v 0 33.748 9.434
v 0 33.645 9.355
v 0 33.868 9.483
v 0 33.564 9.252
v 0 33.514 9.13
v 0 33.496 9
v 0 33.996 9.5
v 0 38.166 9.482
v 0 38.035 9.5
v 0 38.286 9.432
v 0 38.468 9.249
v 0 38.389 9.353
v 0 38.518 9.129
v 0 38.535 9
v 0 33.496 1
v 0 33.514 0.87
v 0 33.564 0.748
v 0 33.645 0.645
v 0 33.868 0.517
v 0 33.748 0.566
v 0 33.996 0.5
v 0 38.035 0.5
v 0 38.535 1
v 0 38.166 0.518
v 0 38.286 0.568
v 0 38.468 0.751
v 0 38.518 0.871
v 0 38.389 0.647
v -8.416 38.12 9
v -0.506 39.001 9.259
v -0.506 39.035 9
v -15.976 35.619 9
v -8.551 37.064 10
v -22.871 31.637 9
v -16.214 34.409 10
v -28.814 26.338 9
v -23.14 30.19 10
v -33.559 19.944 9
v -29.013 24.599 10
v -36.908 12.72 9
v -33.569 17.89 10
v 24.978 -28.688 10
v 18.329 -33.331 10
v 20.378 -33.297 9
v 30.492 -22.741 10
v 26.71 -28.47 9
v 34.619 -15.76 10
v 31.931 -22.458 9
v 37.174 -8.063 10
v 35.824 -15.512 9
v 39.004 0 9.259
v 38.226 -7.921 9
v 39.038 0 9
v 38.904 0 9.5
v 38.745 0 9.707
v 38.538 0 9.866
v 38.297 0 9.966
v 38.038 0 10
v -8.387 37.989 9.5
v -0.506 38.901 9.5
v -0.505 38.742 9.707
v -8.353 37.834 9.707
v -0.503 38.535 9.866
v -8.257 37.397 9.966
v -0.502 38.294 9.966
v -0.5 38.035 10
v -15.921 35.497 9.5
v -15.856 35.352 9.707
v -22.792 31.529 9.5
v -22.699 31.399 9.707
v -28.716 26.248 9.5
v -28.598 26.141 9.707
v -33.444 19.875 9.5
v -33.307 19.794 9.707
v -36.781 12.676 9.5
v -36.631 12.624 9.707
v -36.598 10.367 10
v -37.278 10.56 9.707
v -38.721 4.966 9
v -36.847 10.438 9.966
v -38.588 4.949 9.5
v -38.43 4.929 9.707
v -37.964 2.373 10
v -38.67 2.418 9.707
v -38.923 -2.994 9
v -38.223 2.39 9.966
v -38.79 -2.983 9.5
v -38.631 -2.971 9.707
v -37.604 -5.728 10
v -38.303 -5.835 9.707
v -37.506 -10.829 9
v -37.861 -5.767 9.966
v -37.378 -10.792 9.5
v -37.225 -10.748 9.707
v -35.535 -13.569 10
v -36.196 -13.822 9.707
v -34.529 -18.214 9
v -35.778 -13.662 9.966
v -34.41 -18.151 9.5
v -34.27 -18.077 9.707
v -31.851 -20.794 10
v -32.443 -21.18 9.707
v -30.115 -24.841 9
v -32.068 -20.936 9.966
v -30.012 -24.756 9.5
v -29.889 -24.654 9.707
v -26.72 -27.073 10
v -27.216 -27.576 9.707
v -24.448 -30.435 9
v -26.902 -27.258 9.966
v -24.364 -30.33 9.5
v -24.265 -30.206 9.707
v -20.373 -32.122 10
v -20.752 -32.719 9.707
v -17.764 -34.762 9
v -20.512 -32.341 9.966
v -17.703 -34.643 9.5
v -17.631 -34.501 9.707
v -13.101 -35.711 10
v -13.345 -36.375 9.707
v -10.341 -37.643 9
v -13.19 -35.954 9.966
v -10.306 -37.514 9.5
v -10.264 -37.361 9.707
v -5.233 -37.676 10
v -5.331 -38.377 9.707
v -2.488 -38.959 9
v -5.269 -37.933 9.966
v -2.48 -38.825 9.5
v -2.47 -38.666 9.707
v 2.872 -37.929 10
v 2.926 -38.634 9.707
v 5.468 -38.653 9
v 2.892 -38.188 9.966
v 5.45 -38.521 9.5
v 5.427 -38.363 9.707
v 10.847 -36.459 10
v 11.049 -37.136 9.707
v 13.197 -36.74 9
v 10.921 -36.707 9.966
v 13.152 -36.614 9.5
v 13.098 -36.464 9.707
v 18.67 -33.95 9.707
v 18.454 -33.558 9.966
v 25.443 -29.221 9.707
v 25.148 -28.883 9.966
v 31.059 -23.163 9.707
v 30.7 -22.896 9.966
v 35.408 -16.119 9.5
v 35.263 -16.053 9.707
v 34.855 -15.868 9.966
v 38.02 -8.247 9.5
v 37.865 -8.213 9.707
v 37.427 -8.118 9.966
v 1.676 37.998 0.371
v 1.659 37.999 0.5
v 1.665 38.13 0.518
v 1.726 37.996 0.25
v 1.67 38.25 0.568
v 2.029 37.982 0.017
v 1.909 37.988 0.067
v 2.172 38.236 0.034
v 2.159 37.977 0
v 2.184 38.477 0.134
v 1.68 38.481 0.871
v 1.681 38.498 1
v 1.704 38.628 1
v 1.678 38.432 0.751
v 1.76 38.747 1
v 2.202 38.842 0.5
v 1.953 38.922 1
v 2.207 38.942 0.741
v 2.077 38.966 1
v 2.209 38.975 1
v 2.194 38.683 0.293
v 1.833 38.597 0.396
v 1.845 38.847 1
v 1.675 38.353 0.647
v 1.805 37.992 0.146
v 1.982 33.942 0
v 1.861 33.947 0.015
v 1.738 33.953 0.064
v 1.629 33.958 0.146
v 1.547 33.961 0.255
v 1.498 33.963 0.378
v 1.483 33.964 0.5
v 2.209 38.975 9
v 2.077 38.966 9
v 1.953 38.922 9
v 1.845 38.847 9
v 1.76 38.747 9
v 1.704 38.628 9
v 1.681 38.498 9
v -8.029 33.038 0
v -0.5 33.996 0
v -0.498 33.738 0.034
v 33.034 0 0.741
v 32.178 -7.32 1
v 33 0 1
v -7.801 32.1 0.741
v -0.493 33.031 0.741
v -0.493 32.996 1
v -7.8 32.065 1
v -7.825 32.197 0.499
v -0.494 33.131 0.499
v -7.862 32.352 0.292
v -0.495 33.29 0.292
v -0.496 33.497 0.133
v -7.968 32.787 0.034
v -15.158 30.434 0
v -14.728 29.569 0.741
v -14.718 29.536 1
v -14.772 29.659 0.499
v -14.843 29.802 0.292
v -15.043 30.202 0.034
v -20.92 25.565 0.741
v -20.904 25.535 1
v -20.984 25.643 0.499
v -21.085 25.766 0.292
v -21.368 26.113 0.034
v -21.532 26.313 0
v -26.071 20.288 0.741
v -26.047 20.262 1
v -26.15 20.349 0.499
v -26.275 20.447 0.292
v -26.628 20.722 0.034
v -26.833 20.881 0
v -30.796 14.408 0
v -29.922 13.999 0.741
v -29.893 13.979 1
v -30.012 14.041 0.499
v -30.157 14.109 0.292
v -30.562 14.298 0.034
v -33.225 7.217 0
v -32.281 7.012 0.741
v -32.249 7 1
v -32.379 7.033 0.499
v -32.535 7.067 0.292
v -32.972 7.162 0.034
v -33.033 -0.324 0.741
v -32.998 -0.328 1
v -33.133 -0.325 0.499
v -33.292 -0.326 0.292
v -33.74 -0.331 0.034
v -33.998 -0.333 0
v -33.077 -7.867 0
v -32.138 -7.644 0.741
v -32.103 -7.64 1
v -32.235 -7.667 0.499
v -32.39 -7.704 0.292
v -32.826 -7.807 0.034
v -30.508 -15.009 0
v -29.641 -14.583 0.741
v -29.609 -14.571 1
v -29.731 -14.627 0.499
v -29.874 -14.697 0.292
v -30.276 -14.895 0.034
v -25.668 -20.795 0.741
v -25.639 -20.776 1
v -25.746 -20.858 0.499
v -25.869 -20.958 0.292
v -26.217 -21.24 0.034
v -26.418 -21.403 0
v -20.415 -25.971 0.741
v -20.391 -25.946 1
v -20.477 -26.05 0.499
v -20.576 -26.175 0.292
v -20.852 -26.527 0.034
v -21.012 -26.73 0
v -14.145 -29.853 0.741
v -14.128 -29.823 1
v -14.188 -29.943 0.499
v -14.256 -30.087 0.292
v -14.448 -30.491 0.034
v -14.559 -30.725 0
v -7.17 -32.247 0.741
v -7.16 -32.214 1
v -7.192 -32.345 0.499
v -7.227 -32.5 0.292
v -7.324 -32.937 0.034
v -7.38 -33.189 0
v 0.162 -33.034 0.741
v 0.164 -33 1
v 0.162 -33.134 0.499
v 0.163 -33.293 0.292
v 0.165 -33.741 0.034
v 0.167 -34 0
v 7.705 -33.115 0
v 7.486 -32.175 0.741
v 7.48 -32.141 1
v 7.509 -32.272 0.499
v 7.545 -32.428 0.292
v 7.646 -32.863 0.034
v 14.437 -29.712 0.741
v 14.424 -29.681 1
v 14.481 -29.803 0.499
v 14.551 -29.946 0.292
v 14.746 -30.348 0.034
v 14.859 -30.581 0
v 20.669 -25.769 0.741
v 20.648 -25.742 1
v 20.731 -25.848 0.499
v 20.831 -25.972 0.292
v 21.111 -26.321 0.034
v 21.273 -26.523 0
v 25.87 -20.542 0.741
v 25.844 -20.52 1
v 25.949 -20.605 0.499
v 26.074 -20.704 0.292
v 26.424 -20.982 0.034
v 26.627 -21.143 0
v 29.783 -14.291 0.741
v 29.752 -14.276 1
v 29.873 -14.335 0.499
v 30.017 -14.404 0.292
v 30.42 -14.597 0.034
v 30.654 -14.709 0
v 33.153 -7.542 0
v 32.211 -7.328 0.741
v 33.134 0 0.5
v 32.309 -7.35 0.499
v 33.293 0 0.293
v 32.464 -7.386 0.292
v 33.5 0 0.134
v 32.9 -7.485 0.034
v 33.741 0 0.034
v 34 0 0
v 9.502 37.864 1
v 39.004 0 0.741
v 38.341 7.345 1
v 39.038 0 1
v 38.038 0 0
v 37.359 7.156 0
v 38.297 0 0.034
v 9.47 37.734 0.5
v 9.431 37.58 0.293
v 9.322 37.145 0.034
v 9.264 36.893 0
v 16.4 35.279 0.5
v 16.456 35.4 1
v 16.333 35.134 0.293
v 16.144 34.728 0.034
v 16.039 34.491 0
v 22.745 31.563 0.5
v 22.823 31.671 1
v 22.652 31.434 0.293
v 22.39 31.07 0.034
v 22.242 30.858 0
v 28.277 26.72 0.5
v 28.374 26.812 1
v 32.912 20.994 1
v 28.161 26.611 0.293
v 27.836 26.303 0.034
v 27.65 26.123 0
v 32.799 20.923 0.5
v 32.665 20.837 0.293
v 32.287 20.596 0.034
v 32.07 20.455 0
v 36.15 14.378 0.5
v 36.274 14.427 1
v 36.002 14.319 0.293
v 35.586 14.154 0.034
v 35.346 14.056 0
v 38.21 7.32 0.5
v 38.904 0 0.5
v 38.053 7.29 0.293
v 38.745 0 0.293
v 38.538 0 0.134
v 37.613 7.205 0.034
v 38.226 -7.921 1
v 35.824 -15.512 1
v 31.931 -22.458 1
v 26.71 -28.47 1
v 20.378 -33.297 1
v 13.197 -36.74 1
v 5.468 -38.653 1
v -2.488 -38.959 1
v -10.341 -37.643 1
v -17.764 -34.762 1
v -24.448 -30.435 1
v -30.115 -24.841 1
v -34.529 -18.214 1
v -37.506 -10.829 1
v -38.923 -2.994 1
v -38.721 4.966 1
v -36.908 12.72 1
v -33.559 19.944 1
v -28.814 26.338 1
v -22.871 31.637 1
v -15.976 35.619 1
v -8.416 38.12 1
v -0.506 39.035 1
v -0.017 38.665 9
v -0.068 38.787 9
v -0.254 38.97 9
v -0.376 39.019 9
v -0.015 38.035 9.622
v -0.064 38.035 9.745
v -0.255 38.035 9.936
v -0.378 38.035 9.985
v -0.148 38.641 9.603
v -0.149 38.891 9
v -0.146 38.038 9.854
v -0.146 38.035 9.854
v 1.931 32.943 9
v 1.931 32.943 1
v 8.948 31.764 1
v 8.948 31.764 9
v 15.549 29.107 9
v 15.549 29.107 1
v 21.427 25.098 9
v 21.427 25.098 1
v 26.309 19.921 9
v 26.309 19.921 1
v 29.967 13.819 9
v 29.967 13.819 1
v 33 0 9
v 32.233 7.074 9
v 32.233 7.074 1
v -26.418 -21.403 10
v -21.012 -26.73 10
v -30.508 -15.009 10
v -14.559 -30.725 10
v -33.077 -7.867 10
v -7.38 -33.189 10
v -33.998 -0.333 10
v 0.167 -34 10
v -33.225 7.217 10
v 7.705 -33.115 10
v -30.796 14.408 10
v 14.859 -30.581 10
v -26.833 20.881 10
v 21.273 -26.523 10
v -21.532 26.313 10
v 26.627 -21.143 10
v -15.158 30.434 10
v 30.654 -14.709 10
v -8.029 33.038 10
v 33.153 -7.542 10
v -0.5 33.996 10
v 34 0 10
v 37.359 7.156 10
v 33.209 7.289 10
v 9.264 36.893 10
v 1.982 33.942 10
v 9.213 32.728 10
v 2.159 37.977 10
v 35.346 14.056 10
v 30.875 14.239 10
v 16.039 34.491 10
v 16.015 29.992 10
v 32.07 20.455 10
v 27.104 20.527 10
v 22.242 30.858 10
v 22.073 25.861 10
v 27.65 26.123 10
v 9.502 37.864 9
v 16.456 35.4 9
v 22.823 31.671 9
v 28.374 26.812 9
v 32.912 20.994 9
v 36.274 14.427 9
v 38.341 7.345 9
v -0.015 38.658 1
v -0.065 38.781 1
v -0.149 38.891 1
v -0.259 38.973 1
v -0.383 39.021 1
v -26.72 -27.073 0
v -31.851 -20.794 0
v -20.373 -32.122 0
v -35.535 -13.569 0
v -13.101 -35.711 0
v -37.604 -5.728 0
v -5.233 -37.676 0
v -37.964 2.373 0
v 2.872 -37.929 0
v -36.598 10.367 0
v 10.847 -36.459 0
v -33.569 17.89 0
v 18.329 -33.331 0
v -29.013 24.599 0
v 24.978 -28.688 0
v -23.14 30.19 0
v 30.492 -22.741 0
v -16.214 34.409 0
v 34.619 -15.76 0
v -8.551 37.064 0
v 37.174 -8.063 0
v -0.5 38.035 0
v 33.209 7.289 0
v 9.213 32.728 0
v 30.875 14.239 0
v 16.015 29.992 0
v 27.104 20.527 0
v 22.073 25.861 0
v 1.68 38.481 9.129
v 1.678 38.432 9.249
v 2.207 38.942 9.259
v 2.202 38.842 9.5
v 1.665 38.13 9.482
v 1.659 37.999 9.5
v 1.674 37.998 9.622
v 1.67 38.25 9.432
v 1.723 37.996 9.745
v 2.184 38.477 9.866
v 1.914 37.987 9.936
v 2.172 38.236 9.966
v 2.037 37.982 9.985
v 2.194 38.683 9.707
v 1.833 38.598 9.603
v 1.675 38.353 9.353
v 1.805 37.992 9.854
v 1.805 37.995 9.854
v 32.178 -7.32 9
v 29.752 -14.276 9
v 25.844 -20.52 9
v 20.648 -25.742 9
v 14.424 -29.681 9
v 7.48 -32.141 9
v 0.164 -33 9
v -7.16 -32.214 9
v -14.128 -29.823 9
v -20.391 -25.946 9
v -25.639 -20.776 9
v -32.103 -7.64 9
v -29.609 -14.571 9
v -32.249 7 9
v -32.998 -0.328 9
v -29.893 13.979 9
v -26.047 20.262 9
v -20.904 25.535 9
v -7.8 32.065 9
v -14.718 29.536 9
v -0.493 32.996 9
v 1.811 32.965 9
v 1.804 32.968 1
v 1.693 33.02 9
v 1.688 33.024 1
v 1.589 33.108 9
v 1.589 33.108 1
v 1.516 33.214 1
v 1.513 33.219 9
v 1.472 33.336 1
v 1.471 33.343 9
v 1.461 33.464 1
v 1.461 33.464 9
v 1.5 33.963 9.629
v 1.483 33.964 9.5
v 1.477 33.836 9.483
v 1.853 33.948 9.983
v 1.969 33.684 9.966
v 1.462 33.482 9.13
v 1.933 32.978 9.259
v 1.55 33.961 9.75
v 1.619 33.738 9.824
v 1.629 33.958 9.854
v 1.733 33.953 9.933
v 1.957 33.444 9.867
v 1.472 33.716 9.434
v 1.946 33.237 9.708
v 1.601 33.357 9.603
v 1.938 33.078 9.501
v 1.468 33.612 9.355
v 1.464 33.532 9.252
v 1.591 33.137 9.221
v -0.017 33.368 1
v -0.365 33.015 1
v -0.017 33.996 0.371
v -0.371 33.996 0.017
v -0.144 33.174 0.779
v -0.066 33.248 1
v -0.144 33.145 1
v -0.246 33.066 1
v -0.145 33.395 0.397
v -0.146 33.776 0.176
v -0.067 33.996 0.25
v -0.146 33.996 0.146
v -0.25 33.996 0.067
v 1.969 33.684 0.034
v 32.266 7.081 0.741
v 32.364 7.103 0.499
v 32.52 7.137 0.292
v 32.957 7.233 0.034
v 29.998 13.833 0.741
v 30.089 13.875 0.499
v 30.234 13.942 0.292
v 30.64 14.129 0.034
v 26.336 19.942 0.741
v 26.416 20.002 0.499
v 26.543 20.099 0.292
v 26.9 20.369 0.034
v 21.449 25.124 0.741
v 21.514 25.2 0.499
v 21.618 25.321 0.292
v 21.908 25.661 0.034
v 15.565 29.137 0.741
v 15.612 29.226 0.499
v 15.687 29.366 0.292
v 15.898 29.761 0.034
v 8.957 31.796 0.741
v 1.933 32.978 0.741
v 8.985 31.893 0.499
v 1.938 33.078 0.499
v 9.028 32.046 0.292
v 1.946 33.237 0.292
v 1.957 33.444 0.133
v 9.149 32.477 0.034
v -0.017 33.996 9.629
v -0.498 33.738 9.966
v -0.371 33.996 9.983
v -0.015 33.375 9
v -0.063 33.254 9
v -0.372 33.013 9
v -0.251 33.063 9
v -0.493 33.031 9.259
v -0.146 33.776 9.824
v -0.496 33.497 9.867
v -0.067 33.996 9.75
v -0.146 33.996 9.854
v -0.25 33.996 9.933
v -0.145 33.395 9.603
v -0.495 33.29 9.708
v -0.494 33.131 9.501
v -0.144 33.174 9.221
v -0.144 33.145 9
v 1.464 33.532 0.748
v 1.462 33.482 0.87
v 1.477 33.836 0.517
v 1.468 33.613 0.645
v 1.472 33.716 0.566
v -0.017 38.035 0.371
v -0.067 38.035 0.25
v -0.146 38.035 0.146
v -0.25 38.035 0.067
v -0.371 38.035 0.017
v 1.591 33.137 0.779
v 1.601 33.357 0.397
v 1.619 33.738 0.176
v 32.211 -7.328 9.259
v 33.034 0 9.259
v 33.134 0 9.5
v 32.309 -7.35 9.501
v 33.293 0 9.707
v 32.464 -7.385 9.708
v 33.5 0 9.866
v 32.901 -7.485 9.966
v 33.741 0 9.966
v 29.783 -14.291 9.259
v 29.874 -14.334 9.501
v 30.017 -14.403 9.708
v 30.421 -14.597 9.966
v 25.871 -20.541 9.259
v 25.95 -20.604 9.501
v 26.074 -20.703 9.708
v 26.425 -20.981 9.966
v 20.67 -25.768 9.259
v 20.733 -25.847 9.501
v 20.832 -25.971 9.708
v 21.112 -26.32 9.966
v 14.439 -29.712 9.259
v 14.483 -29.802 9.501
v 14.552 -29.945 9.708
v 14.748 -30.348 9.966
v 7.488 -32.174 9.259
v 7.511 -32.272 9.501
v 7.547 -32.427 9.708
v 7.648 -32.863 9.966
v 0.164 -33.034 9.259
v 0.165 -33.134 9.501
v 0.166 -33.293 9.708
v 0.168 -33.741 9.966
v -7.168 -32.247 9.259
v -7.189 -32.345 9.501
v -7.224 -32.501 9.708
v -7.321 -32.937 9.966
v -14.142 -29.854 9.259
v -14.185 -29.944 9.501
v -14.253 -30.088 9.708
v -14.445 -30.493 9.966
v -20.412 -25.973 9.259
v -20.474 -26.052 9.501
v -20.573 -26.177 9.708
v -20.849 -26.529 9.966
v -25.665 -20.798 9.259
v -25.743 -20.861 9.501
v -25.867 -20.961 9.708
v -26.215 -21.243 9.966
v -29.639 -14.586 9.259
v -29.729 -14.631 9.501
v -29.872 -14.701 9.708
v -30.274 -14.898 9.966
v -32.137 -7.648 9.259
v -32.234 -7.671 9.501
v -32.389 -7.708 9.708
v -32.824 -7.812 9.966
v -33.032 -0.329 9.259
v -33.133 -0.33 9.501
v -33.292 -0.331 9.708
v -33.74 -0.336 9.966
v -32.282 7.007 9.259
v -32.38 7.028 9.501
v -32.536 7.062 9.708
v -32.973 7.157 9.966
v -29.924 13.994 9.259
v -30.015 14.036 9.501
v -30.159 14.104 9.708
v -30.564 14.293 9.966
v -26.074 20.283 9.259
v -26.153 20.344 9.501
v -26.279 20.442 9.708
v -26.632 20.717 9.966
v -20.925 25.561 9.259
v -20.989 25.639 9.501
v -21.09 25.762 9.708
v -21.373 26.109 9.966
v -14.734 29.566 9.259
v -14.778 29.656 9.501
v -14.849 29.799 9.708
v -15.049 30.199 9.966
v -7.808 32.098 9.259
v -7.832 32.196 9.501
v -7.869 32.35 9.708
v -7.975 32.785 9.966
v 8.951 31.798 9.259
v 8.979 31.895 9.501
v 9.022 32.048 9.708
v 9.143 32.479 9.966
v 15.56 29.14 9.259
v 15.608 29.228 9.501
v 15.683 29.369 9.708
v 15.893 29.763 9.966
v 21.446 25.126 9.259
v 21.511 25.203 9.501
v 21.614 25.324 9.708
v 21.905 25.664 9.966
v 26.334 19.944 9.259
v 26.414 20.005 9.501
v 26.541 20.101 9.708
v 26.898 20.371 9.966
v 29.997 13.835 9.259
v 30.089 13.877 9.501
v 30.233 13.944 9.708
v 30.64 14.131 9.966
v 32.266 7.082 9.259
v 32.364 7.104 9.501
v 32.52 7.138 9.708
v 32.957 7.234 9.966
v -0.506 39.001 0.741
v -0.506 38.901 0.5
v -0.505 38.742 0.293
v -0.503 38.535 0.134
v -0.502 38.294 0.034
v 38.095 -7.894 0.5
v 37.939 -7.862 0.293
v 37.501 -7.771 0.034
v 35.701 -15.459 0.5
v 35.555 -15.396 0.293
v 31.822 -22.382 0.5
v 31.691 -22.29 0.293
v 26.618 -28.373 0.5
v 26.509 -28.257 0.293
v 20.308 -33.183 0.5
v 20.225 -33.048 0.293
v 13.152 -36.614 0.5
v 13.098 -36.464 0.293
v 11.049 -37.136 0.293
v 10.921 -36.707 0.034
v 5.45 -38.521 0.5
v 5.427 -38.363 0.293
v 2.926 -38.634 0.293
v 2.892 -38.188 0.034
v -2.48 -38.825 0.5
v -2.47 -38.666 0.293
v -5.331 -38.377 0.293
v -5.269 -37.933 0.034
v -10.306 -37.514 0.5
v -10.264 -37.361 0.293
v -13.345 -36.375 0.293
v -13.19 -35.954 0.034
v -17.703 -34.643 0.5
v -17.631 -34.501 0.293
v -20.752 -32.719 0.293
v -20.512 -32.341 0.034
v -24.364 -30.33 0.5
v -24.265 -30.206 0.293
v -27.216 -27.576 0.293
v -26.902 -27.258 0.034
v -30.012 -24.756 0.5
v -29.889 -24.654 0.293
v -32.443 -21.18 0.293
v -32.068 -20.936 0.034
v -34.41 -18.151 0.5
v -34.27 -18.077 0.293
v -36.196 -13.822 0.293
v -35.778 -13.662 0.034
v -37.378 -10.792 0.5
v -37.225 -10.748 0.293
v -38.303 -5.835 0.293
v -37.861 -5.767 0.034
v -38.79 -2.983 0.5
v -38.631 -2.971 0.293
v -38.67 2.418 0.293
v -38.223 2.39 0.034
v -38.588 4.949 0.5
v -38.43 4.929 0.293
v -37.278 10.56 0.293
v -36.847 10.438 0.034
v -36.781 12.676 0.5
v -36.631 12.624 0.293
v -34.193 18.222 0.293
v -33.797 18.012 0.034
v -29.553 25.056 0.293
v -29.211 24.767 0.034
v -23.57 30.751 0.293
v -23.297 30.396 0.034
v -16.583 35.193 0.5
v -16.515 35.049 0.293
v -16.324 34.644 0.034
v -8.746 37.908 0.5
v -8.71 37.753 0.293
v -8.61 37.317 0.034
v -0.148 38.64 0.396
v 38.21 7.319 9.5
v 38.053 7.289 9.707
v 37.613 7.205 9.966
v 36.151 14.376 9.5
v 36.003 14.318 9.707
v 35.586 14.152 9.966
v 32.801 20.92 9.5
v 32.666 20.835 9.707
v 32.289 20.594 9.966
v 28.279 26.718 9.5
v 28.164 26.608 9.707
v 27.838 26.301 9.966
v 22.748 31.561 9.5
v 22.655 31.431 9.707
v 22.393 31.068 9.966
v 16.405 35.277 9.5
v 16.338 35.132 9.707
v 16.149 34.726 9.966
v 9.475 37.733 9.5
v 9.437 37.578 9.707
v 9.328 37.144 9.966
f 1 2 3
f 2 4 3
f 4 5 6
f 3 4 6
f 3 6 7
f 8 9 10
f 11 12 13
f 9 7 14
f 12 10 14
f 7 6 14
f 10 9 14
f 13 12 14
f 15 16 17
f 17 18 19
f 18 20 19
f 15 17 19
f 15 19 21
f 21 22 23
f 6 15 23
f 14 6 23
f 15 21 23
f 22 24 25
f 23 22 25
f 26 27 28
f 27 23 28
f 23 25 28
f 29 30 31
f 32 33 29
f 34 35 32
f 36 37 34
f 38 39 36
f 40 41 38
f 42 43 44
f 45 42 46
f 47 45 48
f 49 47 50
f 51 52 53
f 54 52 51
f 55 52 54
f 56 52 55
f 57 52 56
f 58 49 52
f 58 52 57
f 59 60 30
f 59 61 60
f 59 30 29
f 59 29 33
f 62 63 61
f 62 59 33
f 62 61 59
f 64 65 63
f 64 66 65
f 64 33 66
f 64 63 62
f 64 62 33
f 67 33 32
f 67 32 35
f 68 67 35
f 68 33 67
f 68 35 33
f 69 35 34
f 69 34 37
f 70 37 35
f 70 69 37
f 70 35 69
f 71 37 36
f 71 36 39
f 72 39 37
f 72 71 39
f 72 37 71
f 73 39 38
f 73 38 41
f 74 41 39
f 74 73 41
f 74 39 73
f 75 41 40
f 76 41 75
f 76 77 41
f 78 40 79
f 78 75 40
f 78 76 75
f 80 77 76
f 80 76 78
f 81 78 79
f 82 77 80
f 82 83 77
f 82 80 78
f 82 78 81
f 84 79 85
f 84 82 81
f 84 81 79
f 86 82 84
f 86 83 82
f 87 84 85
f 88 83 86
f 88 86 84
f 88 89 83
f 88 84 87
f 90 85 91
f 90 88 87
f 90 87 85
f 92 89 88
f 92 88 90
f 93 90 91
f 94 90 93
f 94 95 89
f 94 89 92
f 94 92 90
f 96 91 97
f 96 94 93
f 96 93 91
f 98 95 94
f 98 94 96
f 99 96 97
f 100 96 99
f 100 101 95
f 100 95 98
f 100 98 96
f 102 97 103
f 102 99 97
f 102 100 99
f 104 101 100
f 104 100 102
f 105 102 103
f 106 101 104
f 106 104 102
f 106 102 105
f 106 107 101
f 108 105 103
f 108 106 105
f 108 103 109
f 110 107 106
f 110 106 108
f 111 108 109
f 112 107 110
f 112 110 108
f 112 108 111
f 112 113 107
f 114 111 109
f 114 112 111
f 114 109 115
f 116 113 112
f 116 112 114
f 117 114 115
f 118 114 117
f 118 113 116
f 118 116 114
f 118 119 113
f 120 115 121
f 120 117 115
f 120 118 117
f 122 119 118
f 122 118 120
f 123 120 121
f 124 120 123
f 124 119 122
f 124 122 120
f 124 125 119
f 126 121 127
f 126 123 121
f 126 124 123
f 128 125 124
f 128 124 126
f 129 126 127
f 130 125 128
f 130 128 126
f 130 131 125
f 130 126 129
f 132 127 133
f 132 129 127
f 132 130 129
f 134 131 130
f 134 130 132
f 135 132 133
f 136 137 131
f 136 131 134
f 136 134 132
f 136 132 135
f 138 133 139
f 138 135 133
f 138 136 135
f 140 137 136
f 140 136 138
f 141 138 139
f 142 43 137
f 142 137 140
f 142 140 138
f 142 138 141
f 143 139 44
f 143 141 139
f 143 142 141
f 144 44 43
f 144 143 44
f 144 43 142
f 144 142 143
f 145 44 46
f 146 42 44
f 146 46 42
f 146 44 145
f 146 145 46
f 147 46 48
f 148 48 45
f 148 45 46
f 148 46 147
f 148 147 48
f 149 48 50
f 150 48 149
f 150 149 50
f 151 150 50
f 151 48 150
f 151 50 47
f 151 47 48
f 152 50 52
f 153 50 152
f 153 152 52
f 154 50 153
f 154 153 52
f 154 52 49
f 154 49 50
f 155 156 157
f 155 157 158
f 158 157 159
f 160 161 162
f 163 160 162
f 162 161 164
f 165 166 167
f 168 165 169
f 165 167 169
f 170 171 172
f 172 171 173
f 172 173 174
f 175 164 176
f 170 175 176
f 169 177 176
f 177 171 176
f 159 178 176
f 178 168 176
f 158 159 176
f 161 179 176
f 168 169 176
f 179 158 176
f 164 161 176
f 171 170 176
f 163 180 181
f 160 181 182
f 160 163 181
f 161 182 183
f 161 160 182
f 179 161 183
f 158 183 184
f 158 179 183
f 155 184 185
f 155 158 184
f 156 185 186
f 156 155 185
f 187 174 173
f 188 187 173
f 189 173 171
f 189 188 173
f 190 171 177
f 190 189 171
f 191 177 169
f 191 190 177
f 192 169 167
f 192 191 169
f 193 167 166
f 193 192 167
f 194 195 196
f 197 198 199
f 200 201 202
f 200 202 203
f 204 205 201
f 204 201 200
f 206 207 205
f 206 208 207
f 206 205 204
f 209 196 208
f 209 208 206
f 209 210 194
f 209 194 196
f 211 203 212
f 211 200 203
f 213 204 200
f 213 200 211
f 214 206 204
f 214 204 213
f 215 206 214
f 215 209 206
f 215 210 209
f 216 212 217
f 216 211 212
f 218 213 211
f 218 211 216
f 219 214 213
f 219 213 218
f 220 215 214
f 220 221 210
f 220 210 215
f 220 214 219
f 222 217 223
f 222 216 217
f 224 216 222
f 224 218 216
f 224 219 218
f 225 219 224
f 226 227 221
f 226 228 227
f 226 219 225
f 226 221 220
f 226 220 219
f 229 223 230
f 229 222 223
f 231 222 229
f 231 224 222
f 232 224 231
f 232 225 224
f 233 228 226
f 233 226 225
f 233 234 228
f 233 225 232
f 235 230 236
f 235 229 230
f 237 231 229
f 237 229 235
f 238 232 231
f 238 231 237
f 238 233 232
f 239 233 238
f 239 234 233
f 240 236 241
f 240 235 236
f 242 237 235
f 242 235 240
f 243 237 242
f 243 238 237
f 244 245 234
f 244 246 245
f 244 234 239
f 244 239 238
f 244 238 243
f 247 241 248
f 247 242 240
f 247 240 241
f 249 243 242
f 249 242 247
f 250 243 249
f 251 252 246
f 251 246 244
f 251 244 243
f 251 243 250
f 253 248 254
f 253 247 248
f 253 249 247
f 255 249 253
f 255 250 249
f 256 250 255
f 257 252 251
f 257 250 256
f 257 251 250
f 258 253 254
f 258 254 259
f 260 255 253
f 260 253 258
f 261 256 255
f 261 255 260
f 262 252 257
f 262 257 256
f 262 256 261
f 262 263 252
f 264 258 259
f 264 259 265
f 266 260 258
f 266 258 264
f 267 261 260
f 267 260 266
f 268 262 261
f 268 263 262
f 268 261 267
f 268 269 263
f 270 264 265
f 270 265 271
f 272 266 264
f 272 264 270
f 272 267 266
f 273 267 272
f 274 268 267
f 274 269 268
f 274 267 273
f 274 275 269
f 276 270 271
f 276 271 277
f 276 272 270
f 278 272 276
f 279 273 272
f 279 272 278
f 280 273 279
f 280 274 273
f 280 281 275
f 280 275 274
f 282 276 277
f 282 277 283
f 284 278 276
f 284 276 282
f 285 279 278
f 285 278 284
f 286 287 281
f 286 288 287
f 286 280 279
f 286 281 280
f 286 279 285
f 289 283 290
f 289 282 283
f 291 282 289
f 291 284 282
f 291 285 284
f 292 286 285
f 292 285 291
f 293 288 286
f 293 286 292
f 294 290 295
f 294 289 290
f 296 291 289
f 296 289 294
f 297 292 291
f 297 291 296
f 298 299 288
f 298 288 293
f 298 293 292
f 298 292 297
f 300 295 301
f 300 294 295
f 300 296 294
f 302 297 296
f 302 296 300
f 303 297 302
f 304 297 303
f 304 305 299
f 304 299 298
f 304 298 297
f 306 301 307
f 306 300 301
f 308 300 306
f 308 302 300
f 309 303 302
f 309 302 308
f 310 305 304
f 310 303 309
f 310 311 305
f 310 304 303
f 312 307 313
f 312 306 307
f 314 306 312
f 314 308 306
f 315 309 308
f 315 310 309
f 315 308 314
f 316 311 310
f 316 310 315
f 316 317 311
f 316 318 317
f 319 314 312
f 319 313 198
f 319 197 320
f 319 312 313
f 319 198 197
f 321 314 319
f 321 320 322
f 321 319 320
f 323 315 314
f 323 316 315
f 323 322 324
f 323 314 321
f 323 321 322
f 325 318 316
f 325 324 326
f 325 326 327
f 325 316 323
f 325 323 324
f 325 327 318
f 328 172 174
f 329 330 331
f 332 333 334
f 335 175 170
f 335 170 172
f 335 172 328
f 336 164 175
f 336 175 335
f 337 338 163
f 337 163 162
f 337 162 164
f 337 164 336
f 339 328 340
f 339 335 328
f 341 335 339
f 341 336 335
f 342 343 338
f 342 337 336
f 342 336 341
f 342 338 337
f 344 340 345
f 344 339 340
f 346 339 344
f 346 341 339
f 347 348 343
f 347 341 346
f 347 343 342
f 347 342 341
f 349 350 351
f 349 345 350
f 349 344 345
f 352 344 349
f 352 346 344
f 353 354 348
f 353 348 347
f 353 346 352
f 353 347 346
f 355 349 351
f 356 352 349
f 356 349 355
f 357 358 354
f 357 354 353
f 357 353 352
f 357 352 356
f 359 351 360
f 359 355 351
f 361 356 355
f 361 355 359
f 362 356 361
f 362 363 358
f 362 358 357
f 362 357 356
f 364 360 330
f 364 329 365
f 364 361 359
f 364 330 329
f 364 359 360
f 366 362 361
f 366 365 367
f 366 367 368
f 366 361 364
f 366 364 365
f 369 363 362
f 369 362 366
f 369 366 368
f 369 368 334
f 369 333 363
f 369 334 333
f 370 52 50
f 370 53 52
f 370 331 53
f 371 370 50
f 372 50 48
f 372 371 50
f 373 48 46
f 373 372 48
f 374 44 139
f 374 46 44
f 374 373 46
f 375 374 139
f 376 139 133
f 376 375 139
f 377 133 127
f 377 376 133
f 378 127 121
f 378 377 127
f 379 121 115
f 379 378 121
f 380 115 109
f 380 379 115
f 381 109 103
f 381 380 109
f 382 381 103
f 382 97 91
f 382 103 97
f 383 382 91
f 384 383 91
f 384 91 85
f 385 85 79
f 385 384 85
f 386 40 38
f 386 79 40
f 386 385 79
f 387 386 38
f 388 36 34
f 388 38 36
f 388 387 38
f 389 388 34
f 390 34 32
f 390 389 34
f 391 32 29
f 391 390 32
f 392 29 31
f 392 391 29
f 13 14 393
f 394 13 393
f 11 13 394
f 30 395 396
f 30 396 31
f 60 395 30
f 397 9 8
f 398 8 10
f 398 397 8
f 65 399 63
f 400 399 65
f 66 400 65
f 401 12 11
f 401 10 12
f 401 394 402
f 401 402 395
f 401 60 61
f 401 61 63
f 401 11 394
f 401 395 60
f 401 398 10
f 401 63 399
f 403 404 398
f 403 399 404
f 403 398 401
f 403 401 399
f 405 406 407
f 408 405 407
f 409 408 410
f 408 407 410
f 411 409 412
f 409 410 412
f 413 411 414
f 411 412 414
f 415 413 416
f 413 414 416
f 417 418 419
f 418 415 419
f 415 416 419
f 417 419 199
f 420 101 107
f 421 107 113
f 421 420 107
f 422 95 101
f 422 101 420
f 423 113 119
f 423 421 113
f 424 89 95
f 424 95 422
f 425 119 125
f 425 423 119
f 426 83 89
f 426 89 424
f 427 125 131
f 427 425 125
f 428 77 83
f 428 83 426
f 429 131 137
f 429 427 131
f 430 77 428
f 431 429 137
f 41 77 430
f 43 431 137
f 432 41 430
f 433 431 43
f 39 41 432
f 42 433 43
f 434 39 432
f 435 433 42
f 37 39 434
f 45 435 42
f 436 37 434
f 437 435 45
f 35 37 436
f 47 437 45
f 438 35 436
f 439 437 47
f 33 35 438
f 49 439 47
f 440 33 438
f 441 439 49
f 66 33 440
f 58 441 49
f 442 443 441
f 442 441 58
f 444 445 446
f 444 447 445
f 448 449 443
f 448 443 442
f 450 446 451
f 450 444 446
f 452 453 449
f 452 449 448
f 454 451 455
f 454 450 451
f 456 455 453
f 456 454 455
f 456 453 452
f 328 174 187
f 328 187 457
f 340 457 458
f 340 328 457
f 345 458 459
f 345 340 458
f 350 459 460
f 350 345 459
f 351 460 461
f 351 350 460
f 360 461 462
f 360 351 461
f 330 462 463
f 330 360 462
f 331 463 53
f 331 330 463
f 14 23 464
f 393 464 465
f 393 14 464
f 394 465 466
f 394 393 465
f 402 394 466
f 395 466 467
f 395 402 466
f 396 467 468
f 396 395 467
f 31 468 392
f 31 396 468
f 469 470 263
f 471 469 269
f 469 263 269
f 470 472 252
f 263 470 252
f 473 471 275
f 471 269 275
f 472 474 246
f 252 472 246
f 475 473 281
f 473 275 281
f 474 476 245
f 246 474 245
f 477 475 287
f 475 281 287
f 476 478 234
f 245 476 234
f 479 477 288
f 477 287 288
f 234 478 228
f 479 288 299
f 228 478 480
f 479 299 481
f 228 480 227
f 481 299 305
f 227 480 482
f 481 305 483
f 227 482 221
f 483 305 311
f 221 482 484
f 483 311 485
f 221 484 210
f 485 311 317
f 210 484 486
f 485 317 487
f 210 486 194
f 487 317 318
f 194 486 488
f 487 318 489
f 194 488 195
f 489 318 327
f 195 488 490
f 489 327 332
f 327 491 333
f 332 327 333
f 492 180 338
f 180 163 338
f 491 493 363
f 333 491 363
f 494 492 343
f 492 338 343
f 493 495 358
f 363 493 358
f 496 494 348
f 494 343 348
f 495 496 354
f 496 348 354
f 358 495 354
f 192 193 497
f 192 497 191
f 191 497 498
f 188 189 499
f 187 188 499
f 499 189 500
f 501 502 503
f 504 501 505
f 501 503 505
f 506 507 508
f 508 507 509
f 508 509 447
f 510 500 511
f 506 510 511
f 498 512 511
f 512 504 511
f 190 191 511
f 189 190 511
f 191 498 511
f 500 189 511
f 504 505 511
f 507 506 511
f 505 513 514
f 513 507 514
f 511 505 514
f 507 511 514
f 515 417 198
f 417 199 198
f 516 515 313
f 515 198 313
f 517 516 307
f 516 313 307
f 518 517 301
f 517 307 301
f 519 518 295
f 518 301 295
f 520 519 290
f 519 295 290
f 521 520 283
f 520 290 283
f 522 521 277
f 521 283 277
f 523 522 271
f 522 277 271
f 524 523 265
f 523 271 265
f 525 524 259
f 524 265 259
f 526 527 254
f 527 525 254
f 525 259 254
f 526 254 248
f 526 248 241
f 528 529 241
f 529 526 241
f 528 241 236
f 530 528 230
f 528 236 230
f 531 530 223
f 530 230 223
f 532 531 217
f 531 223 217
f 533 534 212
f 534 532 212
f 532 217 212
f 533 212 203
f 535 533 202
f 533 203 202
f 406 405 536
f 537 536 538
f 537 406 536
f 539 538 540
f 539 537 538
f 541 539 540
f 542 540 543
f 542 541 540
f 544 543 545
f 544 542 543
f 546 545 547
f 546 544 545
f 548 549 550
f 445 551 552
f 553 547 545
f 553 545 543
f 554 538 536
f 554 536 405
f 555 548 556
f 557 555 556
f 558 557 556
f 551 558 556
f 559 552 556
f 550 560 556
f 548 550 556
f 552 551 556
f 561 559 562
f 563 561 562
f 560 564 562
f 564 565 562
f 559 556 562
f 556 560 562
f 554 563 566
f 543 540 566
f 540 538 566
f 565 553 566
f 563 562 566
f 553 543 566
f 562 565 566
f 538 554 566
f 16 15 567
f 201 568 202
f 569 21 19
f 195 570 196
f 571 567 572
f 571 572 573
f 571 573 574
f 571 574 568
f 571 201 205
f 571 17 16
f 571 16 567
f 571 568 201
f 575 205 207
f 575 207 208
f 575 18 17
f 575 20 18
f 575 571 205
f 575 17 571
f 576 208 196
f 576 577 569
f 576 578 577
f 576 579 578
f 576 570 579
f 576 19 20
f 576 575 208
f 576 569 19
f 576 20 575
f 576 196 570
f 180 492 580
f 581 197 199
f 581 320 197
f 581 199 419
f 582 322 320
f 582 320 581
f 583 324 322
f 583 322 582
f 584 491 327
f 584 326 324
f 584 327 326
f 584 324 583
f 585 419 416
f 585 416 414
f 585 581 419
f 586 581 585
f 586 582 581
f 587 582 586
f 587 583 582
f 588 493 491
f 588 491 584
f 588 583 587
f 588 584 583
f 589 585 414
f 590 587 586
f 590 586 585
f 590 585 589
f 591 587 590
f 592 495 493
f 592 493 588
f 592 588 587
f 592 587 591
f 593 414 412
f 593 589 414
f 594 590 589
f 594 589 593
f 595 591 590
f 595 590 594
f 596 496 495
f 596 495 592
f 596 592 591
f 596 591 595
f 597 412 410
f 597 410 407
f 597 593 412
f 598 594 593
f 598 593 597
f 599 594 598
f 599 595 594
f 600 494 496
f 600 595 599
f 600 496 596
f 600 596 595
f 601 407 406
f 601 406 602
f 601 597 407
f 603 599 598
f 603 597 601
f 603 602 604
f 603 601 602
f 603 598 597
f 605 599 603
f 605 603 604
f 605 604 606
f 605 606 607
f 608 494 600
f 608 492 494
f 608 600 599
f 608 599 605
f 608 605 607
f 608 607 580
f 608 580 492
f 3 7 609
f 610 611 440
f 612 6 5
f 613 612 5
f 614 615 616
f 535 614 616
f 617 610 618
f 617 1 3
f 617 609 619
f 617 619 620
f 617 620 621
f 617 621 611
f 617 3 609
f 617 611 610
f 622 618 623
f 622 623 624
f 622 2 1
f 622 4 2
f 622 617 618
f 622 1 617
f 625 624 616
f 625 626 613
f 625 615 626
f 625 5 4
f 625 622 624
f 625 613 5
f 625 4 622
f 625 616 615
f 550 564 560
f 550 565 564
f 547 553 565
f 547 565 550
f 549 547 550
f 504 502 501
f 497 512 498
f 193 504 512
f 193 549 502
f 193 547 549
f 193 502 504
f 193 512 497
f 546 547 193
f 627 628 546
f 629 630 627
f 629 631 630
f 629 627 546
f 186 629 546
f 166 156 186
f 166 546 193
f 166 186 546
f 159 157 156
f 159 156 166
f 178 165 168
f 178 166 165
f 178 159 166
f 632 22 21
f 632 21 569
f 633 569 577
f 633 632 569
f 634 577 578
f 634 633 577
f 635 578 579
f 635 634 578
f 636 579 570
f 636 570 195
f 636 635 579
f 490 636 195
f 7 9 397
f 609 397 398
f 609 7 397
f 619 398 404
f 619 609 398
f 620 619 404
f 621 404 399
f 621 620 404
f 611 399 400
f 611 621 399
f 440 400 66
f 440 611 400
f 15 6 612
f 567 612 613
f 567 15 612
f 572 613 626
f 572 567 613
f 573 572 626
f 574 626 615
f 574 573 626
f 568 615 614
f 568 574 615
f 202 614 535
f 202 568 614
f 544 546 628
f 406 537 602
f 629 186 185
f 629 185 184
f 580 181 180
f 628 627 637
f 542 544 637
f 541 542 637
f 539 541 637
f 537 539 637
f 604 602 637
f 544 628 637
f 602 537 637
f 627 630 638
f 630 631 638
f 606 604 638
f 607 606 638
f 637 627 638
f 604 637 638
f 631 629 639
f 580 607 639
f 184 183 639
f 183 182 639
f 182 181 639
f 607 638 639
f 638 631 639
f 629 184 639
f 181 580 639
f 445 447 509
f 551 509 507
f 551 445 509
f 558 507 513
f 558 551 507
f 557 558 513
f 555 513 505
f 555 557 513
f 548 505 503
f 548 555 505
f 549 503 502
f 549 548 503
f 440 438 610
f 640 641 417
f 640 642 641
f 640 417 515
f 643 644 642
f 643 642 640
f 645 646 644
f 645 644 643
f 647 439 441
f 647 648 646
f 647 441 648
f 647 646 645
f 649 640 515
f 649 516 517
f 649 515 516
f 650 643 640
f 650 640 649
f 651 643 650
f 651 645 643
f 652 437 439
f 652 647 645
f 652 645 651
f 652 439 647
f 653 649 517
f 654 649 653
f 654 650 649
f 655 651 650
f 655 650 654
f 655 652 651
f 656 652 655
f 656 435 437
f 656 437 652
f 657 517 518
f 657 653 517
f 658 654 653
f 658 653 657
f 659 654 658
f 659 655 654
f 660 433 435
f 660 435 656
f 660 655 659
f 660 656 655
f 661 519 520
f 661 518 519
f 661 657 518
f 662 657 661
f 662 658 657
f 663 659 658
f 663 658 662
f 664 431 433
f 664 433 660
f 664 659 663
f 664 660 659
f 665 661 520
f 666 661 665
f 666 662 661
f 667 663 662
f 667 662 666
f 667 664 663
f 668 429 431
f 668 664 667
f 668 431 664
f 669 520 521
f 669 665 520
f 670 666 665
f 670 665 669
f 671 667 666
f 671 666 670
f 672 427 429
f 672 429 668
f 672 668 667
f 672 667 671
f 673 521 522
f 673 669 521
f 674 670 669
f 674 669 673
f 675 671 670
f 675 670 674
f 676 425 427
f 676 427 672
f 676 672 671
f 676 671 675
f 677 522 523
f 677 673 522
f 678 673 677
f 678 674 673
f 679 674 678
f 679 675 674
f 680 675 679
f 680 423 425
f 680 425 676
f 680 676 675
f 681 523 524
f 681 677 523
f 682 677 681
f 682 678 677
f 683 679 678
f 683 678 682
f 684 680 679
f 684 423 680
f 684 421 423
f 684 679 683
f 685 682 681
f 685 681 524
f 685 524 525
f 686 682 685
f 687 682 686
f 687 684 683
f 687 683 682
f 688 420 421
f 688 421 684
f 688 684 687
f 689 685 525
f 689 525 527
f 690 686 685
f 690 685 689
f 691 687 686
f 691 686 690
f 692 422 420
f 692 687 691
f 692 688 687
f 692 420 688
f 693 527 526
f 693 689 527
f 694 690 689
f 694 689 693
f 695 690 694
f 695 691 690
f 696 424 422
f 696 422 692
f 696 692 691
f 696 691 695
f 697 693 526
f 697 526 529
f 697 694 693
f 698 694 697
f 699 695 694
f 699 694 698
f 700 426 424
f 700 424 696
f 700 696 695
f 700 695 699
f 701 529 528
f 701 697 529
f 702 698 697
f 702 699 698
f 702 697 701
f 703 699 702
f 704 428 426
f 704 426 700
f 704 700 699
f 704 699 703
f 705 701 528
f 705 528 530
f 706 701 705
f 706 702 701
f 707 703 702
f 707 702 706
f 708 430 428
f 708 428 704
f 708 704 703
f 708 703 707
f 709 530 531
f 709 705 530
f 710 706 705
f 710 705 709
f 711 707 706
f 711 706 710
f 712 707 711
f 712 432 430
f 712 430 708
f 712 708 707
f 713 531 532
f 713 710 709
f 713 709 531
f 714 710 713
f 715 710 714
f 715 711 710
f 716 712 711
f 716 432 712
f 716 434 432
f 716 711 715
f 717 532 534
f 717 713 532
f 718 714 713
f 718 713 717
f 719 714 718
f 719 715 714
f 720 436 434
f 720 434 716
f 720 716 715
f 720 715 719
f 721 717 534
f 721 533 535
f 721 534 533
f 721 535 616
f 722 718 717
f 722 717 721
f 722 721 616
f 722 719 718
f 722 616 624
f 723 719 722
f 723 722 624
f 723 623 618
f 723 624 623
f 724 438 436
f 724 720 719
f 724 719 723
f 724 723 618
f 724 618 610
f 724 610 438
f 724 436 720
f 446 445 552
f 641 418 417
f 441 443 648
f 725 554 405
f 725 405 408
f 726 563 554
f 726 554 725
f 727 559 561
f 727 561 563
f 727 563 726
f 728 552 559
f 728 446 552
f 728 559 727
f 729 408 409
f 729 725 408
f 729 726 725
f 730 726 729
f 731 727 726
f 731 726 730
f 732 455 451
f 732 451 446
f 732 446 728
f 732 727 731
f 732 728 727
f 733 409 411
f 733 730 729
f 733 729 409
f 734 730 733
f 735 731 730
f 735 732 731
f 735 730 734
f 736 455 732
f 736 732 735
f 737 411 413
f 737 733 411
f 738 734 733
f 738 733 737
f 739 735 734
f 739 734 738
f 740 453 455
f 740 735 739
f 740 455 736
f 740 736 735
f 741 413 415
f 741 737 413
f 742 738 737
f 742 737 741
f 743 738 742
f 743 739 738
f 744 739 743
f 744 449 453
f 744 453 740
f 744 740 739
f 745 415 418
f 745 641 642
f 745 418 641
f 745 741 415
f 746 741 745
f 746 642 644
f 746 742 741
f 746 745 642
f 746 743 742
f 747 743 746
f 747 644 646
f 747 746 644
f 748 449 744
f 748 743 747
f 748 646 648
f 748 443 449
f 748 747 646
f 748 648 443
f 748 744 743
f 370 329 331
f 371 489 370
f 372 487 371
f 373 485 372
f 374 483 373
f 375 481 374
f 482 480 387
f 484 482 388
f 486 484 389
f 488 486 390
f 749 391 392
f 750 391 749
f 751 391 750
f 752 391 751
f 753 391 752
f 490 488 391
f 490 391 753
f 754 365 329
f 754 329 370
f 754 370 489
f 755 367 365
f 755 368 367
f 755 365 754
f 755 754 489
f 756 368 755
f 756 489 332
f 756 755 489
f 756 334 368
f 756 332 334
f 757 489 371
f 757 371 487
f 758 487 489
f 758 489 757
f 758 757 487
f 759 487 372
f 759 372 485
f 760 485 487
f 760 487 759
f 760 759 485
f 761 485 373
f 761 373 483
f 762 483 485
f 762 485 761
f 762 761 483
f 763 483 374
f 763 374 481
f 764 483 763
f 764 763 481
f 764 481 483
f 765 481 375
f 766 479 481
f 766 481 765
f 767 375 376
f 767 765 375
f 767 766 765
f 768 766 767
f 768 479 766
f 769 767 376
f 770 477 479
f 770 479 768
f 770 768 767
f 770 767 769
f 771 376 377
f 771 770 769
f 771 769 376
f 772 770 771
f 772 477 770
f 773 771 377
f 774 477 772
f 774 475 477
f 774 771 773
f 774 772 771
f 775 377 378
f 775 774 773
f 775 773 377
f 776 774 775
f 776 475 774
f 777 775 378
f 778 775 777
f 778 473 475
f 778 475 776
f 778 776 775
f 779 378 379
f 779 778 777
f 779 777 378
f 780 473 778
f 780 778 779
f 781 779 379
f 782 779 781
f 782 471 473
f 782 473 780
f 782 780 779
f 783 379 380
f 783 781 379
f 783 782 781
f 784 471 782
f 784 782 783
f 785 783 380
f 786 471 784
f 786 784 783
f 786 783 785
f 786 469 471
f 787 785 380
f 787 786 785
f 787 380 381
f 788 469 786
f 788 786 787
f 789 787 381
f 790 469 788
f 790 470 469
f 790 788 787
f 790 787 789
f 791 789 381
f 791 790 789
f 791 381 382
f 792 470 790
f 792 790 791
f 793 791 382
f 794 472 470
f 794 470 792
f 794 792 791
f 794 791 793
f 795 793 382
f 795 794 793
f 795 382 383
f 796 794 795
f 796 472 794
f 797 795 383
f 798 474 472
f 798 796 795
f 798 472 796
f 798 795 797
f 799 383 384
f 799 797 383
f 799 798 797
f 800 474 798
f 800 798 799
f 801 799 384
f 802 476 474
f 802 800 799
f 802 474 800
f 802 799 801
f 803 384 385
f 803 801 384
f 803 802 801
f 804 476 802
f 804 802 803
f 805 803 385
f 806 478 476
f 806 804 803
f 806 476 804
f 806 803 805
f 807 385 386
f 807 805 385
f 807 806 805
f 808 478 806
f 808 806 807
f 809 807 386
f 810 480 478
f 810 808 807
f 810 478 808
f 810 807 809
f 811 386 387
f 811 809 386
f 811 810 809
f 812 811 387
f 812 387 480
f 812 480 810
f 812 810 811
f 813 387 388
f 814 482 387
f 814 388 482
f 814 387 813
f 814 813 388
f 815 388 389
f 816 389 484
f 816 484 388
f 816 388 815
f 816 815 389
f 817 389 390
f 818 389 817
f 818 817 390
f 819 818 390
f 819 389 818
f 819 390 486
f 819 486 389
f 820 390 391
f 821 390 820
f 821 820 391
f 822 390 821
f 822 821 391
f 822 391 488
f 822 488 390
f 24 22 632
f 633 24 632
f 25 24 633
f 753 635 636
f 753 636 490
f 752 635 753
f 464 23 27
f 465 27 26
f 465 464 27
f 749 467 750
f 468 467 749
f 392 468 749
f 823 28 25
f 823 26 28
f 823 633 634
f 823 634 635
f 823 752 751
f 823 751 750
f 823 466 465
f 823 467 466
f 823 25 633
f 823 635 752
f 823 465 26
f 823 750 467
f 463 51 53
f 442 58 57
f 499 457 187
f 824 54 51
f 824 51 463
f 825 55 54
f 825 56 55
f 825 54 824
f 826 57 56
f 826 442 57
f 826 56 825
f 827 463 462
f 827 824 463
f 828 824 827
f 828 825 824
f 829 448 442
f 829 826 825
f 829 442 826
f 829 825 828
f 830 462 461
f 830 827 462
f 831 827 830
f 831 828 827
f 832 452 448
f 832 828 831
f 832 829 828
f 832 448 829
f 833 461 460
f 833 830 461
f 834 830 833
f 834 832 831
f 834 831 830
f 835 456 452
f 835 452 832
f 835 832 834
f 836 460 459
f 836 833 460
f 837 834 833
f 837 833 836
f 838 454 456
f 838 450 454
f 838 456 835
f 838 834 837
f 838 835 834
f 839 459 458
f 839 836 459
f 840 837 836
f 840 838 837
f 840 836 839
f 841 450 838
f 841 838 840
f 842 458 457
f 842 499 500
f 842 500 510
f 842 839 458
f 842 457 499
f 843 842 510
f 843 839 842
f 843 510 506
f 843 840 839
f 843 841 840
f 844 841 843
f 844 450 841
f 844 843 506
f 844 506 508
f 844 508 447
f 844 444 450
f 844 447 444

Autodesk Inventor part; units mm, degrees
ref_plane "YZ Plane" through (0, 0, 0) normal (1, 0, 0) x (0, 1, 0)
ref_plane "XZ Plane" through (0, 0, 0) normal (0, 1, 0) x (-1, 0, 0)
ref_plane "XY Plane" through (0, 0, 0) normal (0, 0, 1) x (1, 0, 0)
sketch "Sketch13" plane through (0, 0, 0) normal (0, 0, 1) x (1, 0, 0)
  circle A0 centre (0, 0) radius 33
  circle A1 centre (0, 0) radius 39.038
  line L0 (0, 0) -> (0, 39.038)
  line L1 (0, 0) -> (1.7028, 39.0008)
  line L2 (0, 0) -> (39.038, 0) construction
  point P0 (1.4394, 32.9686)
  point P1 (0, 33)
  dimension "d62" = 66
  dimension "d63" = 78.076
  dimension "d64" = 87.5
extrude "Extrusion12" add sketch "Sketch13" along normal blind 10 contours A0 L1 A1 L0 picked at (-2.8956, 36.6991)
fillet "Fillet14" radius 1 4 edges at (-0.8516, -39.0287, 10) (-0.7199, -32.9921, 10) (-0.8516, -39.0287, 0) (-0.7199, -32.9921, 0)
fillet "Fillet15" radius 0.5 16 edges at (1.7028, 39.0008, 5) (1.69, 38.7082, 9.7071) (1.5711, 35.9847, 10) (1.4522, 33.2612, 9.7071) (1.4394, 32.9686, 5) (1.4522, 33.2612, 0.2929) (1.5711, 35.9847, 0) (1.69, 38.7082, 0.2929) (0, 36.019, 0) (0, 33.2929, 0.2929) (0, 33, 5) (0, 33.2929, 9.7071) (0, 36.019, 10) (0, 38.7451, 9.7071) (0, 39.038, 5) (0, 38.7451, 0.2929)
sketch "Sketch4" plane through (40, -2.75, -25.3875) normal (1, 0, 0) x (0, 0, -1)
  line L0 (-51.025, 0.25) -> (-51.6313, 0.25) projected
  line L1 (-51.025, 0.25) -> (-55.267, 0.25)
  line L2 (-55.267, 0.25) -> (-55.267, 5.25)
  line L3 (-55.267, 5.25) -> (-51.025, 5.25)
  line L4 (-51.025, 5.25) -> (-51.025, 0.25)
  point P0 (-25.3875, 2.75)
  point P1 (-51.6313, 0.25)
  dimension "d33" = 4.242
  dimension "d34" = 5
sketch "Sketch5" plane through (40, -2.75, -25.3875) normal (1, 0, 0) x (0, 0, -1)
  line L0 (-51.6563, 0.25) -> (-55.267, 0.25) projected
  line L1 (-55.267, 5.25) -> (-51.6563, 5.25) projected
  line L2 (-55.267, 0.25) -> (-52.267, 0.25)
  line L3 (-52.267, 0.25) -> (-52.267, 5.25)
  line L4 (-52.267, 5.25) -> (-55.267, 5.25)
  line L5 (-55.267, 5.25) -> (-55.267, 0.25)
  point P0 (-25.3875, 2.75)
  point P1 (-55.267, 5.25)
  point P2 (-52.267, 0.25)
  dimension "d37" = 3
sketch "Sketch6" plane through (220, -2.75, -25.3875) normal (1, 0, 0) x (0, 0, -1)
  line L0 (-51.6563, 0.25) -> (-55.267, 0.25) projected
  line L1 (-55.267, 0.25) -> (-51.025, 0.25)
  line L2 (-51.025, 0.25) -> (-51.025, 5.25)
  line L3 (-51.025, 5.25) -> (-55.267, 5.25)
  line L4 (-55.267, 5.25) -> (-55.267, 0.25)
  point P0 (-25.3875, 2.75)
  dimension "d40" = 4.242
sketch "Sketch7" plane through (30, -2.75, -25.3875) normal (-1, 0, 0) x (0, 0, 1)
  line L0 (55.267, 0.25) -> (55.267, 5.25) projected
  line L1 (55.267, 0.25) -> (58.267, 0.25)
  line L2 (58.267, 0.25) -> (58.267, 5.25)
  line L3 (58.267, 5.25) -> (55.267, 5.25)
  line L4 (55.267, 5.25) -> (55.267, 0.25)
  point P0 (25.3875, 2.75)
  dimension "d43" = 3
  dimension "d44" = 5
sketch "Sketch8" plane through (30, -2.75, -25.3875) normal (-1, 0, 0) x (0, 0, 1)
  line L0 (51.6563, 0.25) -> (58.267, 0.25) projected
  line L1 (58.267, 5.25) -> (51.6563, 5.25) projected
  line L2 (58.267, 0.25) -> (57.025, 0.25)
  line L3 (57.025, 0.25) -> (57.025, 5.25)
  line L4 (57.025, 5.25) -> (58.267, 5.25)
  line L5 (58.267, 5.25) -> (58.267, 0.25)
  point P0 (25.3875, 2.75)
  point P1 (57.025, 0.25)
  dimension "d47" = 1.242
sketch "Sketch9" plane through (40, -2.75, -25.3875) normal (1, 0, 0) x (0, 0, -1)
  line L0 (-52.267, 0.25) -> (-51.025, 0.25) projected
  line L1 (-51.025, 5.25) -> (-51.025, 0.25) projected
  line L2 (-52.267, 0.25) -> (-51.025, 0.25)
  line L3 (-51.025, 0.25) -> (-51.025, 5.25)
  line L4 (-51.025, 5.25) -> (-52.267, 5.25)
  line L5 (-52.267, 5.25) -> (-52.267, 0.25)
  point P0 (-25.3875, 2.75)
properties part number "4001_Bias_Coil_Holder_Tube_Mount_Layer2_MPSv2_v2" material "Acetal Resin, White"
